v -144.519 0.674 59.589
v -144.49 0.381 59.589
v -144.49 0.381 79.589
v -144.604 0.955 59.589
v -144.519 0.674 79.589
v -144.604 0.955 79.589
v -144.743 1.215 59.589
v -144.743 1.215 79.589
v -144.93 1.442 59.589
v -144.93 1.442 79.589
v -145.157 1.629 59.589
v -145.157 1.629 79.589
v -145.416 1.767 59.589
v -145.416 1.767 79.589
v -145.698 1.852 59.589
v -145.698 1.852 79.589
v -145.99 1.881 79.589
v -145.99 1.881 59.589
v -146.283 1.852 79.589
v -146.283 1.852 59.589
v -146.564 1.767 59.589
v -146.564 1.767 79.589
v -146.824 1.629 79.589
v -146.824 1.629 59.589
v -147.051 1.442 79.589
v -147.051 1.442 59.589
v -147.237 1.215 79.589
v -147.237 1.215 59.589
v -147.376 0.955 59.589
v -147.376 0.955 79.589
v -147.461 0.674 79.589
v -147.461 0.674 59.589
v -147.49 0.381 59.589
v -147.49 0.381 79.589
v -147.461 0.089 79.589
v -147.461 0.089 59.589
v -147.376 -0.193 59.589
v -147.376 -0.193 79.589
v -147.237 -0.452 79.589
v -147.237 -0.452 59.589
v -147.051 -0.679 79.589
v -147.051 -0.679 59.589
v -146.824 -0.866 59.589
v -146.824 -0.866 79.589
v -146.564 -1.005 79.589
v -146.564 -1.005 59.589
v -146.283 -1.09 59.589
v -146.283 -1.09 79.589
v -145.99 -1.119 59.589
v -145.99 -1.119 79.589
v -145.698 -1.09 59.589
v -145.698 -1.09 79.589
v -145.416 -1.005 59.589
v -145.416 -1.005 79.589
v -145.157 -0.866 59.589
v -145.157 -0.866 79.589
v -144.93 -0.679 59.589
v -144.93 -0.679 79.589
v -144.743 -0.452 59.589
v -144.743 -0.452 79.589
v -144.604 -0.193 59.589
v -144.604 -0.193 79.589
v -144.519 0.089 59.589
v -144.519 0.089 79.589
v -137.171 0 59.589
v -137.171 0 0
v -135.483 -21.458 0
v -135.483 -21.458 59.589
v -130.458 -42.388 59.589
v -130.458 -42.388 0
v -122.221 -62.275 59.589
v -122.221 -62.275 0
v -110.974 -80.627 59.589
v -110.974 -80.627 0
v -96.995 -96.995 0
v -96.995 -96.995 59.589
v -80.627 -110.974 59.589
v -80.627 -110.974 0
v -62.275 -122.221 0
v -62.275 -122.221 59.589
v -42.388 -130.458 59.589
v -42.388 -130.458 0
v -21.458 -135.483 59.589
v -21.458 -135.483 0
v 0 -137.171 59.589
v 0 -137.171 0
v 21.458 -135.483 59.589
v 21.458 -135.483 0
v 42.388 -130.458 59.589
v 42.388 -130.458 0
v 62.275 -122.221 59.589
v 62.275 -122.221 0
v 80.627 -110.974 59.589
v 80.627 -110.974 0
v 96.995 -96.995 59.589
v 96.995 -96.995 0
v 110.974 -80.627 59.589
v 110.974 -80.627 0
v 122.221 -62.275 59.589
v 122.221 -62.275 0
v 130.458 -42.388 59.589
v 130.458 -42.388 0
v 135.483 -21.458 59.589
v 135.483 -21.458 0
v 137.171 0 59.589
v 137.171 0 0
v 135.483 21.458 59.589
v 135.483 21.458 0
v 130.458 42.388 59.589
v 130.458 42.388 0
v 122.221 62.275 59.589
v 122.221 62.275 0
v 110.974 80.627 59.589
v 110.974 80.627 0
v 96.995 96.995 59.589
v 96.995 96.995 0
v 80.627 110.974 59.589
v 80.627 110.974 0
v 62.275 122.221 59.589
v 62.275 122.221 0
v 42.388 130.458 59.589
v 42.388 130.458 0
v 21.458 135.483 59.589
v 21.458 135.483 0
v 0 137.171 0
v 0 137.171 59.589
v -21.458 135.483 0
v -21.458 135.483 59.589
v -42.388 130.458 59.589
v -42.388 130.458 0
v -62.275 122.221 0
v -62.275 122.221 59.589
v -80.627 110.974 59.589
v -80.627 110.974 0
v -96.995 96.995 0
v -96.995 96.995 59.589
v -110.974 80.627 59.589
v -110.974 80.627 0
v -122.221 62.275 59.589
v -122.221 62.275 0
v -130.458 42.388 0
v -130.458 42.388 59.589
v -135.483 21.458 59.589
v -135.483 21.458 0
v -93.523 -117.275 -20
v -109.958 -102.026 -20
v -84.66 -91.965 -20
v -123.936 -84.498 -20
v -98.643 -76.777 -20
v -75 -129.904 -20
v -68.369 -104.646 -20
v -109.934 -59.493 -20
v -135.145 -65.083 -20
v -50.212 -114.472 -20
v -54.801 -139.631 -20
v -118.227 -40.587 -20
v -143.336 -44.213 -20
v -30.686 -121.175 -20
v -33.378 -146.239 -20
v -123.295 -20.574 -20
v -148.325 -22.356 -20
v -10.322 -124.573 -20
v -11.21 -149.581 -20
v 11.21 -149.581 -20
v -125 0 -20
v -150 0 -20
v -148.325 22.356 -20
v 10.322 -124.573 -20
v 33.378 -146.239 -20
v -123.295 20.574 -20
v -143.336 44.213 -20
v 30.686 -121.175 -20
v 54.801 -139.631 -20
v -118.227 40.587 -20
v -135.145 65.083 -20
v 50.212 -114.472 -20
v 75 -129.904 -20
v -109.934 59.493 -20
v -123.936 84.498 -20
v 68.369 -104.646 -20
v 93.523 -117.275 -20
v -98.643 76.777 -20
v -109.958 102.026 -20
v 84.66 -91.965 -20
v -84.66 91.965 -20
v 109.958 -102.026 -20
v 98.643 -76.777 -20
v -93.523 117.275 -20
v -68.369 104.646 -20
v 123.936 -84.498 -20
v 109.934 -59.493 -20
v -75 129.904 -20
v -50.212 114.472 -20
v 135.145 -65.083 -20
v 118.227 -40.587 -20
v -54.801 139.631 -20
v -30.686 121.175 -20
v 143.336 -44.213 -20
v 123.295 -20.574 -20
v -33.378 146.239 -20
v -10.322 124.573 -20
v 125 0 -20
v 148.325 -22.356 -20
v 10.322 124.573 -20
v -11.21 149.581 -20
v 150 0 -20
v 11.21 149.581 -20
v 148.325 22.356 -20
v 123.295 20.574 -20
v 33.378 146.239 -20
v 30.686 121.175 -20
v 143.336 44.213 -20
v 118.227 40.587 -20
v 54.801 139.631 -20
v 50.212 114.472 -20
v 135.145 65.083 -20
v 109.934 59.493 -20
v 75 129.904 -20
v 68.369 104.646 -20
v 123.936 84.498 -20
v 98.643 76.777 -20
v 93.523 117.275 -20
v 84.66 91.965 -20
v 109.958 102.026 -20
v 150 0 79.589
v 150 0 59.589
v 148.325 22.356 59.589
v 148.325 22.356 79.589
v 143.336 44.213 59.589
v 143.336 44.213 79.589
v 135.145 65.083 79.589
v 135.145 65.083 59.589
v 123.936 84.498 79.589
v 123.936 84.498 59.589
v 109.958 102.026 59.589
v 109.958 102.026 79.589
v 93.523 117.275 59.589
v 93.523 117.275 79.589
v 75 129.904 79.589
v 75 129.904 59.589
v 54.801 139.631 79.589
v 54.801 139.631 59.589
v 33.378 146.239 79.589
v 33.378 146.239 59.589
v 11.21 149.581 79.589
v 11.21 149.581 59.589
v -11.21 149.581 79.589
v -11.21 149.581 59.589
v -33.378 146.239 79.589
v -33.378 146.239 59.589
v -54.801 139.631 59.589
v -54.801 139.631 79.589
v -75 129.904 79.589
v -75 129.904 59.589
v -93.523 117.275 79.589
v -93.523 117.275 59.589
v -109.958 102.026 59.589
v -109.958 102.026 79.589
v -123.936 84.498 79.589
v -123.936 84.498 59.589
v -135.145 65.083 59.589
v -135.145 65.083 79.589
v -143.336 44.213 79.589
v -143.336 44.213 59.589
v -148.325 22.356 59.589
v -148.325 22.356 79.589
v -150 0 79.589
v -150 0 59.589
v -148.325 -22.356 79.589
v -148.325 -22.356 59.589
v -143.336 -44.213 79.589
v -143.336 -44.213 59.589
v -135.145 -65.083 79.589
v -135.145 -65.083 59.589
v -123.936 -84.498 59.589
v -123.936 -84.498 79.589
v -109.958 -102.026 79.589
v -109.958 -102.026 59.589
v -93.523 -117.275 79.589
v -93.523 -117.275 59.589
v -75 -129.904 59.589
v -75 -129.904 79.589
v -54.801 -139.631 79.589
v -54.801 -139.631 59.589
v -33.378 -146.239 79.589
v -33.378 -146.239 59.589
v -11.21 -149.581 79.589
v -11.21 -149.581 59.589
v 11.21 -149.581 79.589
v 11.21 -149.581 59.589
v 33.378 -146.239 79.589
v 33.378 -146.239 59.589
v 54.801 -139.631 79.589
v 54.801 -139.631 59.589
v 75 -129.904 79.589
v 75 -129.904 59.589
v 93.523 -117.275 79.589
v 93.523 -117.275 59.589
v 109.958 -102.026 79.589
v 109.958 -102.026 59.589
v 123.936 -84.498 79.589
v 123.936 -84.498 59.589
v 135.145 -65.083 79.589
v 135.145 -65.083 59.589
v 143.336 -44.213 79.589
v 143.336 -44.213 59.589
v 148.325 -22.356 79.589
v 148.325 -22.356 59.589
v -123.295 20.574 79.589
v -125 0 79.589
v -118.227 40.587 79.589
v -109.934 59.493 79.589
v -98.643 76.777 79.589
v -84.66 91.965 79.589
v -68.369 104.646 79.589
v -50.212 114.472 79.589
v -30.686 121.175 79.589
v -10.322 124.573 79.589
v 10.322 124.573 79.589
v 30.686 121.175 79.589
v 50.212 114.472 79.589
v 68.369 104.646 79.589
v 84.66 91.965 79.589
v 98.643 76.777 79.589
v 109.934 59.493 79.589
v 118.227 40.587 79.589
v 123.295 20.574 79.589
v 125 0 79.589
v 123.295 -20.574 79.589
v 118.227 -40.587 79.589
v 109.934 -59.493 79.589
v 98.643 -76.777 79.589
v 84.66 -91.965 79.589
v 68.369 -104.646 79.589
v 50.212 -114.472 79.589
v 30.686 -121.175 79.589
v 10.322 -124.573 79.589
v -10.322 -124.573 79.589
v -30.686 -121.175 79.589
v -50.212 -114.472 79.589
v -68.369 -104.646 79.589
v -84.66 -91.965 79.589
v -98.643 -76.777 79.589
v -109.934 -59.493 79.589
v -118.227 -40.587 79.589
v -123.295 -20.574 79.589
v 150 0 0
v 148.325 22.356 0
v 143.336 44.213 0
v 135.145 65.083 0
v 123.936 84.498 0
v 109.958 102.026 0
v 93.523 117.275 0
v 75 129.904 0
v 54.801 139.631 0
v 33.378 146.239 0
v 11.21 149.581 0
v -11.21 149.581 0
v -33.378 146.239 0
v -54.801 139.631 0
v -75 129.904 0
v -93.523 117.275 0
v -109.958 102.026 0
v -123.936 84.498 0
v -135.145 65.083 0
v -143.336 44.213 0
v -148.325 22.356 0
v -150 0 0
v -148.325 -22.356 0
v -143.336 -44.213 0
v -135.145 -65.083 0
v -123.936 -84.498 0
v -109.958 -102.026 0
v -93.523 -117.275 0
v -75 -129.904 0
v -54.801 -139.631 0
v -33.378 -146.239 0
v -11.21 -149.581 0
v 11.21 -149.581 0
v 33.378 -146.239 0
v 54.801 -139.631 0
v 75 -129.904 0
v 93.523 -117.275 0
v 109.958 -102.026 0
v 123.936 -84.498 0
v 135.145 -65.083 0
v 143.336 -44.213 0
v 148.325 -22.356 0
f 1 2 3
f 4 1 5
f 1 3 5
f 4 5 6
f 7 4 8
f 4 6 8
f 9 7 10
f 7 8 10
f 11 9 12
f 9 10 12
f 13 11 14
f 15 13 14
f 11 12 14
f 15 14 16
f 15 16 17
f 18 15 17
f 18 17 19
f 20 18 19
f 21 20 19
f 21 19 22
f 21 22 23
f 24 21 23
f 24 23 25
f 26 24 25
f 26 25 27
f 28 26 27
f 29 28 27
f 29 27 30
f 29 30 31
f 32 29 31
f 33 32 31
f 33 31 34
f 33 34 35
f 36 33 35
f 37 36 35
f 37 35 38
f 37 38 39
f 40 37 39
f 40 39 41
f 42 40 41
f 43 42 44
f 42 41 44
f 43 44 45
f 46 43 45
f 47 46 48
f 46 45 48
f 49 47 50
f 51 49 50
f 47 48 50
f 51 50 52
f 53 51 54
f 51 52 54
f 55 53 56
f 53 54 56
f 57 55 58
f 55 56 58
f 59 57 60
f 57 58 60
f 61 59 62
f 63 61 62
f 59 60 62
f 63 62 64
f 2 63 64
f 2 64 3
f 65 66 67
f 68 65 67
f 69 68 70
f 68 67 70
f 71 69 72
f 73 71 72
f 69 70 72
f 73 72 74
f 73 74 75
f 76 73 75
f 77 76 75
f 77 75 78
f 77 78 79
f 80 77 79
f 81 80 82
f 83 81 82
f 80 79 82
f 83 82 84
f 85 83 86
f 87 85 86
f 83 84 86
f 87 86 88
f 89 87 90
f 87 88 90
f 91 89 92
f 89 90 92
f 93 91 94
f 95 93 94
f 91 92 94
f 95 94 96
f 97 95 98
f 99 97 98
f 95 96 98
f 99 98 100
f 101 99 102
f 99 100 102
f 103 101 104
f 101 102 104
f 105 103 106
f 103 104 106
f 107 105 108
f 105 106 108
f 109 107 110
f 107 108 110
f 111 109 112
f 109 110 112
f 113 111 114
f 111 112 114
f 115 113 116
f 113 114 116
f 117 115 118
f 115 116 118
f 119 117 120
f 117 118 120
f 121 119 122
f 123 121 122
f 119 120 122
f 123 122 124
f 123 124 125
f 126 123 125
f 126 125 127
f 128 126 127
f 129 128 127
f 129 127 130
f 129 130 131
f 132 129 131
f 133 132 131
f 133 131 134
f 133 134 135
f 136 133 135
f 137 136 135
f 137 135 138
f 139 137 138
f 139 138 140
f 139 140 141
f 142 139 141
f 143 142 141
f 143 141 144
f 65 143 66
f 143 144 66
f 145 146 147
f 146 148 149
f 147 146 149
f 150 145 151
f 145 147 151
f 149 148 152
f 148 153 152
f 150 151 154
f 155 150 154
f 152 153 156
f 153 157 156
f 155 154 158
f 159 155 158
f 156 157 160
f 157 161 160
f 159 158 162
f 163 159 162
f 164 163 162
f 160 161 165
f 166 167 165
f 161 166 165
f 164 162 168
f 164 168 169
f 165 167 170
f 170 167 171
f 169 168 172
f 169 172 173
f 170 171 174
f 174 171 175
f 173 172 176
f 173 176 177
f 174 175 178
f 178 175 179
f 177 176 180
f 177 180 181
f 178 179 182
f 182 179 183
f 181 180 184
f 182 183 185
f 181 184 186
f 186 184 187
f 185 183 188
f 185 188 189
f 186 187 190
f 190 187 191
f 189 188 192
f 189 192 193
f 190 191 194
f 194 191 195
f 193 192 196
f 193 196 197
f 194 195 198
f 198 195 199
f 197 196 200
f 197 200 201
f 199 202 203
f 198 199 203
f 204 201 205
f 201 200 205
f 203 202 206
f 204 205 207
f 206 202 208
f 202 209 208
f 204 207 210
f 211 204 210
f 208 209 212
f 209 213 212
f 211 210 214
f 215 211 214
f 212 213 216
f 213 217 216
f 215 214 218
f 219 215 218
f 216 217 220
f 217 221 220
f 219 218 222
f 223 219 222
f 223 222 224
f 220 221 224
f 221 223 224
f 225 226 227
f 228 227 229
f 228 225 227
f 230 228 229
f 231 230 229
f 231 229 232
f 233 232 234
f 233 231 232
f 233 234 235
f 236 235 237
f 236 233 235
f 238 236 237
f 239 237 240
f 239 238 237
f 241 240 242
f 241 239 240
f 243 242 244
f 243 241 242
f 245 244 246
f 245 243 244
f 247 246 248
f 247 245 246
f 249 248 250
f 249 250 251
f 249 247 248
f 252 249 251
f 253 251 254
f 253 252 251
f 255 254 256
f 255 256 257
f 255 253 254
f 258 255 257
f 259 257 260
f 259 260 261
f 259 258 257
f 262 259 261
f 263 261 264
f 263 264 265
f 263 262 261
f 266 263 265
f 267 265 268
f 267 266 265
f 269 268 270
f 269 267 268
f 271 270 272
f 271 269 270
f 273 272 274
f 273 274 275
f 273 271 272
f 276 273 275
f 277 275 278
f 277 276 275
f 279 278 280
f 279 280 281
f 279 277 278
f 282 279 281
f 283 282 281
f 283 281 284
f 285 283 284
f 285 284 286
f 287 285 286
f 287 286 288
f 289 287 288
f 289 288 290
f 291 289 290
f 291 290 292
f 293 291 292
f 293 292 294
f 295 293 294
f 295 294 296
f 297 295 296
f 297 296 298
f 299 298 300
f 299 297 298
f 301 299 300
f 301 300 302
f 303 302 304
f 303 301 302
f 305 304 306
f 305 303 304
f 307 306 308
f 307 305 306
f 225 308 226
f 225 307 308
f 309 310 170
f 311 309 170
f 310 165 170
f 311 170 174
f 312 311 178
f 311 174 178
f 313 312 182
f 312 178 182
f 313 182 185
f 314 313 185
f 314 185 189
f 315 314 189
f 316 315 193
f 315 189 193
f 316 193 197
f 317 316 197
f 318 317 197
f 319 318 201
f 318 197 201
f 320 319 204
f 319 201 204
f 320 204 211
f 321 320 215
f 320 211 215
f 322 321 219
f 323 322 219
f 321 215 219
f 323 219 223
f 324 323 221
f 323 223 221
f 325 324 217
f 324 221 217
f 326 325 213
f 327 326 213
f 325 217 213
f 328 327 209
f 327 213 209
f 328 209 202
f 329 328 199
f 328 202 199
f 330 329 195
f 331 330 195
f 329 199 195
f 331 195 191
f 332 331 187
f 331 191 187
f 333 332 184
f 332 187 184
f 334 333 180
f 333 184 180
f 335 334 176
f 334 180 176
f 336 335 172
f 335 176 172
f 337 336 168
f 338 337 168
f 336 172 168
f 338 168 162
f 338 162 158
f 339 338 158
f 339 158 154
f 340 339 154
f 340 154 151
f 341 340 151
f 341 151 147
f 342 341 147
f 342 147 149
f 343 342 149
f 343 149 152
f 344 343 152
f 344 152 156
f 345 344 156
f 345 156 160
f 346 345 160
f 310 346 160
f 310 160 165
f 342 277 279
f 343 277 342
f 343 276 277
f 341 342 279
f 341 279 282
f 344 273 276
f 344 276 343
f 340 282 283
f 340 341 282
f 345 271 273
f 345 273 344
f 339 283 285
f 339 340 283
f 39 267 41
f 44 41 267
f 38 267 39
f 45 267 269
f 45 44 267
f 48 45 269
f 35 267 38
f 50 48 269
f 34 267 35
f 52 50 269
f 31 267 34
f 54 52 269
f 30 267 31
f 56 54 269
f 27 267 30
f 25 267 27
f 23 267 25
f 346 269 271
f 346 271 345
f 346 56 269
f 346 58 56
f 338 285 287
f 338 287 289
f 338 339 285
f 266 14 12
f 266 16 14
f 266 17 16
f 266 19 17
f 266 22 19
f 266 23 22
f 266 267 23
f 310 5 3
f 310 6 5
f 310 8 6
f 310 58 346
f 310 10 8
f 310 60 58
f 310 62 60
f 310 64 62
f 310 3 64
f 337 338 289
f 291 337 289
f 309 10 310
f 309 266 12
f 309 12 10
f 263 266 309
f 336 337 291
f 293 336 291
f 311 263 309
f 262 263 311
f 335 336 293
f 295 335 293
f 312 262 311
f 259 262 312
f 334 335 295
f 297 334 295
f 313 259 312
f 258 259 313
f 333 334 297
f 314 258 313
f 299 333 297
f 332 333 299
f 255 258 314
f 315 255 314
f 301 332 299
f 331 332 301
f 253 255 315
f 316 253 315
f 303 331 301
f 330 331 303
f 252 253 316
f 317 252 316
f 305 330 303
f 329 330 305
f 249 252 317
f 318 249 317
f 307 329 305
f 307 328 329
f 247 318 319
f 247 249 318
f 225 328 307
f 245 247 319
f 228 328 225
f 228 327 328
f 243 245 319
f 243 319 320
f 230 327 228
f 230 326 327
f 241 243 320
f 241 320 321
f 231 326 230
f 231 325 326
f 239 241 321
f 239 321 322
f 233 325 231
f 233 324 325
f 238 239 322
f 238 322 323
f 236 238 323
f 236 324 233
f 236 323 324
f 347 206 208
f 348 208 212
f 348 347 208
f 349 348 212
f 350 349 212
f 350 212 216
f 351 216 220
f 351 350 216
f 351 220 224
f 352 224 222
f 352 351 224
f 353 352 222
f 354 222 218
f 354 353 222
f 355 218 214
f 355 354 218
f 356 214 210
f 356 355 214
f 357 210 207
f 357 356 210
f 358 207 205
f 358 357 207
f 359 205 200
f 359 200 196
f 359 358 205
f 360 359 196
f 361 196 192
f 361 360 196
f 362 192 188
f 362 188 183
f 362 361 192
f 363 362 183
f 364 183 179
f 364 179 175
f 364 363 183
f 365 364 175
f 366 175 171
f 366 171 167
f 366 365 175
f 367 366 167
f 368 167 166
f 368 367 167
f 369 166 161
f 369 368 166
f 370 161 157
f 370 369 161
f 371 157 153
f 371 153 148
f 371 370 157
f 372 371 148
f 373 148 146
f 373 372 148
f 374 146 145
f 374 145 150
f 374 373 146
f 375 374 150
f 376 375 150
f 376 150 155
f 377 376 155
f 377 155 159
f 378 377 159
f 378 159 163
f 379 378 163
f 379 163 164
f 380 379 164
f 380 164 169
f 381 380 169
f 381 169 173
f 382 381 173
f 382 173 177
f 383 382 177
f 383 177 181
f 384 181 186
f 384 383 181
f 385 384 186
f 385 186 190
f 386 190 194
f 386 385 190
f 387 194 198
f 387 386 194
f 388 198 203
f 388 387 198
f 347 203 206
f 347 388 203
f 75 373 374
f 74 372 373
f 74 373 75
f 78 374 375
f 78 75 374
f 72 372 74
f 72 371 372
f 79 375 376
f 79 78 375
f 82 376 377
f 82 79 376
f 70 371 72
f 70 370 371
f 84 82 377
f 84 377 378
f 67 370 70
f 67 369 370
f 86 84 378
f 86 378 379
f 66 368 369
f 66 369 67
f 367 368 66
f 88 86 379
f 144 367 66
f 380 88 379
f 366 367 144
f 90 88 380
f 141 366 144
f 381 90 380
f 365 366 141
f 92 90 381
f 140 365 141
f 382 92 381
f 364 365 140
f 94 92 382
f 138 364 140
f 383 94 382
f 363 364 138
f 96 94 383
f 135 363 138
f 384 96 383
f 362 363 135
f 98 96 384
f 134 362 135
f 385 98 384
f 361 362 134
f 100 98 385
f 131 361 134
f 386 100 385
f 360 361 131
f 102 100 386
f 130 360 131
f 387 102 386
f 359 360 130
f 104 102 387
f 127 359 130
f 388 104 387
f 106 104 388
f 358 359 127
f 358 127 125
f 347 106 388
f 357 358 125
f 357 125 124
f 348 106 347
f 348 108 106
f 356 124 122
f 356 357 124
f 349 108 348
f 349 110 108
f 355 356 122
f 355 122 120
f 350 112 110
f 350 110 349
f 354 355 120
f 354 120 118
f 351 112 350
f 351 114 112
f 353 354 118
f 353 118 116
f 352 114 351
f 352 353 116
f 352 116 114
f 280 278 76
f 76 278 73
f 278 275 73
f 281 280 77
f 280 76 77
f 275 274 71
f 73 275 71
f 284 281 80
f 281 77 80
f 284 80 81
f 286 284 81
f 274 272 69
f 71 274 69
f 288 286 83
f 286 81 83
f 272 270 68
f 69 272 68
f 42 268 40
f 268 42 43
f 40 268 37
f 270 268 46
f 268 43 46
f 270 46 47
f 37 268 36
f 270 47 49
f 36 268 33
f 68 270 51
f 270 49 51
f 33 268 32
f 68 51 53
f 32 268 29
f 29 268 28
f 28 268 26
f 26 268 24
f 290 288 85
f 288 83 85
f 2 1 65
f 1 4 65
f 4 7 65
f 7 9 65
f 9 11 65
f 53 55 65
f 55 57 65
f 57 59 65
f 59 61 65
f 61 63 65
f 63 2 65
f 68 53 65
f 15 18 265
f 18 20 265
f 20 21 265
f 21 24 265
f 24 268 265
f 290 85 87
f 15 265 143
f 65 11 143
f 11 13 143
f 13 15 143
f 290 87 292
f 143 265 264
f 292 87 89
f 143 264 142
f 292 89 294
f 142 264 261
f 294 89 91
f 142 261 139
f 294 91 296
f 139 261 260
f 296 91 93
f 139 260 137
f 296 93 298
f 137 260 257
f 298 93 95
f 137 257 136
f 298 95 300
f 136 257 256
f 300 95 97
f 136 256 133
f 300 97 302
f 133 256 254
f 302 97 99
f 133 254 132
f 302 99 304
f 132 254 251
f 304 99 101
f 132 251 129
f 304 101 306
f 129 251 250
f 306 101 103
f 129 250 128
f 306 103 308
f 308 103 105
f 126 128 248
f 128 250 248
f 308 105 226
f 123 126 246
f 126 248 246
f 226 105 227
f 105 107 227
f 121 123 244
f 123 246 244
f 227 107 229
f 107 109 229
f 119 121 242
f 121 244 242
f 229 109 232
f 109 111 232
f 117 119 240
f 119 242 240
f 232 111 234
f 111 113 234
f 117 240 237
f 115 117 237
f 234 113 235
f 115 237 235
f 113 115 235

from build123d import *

# Parameters (mm, degrees)
SKETCH1_R           = 150
BOSS_EXTRUDE2_DEPTH = 20
CUT_EXTRUDE1_REACH  = 215.073
SKETCH2_R           = 125
SKETCH3_R           = 137.171463505
BOSS_EXTRUDE3_DEPTH = 59.588855351
BOSS_EXTRUDE4_START = 20
SKETCH4_R           = 150
BOSS_EXTRUDE4_DEPTH = 20
SKETCH6_R           = 125
CUT_EXTRUDE2_DEPTH  = 227.570929062
CUT_EXTRUDE5_REACH  = 236.346
SKETCH7_R           = 1.5


with BuildPart() as part:
    # Sketch1 → Boss-Extrude2 (new body)
    with BuildSketch(Plane.XY):
        Circle(SKETCH1_R)
    extrude(amount=-BOSS_EXTRUDE2_DEPTH)

    # Sketch2 → Cut-Extrude1 (cut, up to next)
    with BuildSketch(Plane(origin=(0, 0, -20), x_dir=(-1, 0, 0), z_dir=(0, 0, -1)), mode=Mode.PRIVATE) as cut_extrude1_sk1:
        Circle(SKETCH2_R)
    cut_extrude1_tool1 = extrude(cut_extrude1_sk1.sketch, amount=-CUT_EXTRUDE1_REACH, mode=Mode.PRIVATE) & part.part
    add(cut_extrude1_tool1.solids().sort_by_distance((0, 0, -20))[0], mode=Mode.SUBTRACT)

    # Sketch3 → Boss-Extrude3 (add)
    with BuildSketch(Plane.XY):
        with Locations(Location((0, 0, 0), (0, 0, 180))):
            Circle(SKETCH3_R)
    extrude(amount=BOSS_EXTRUDE3_DEPTH)

    # Sketch4 → Boss-Extrude4 (add)
    with BuildSketch(Plane.XY.offset(59.588855351).offset(BOSS_EXTRUDE4_START)):
        Circle(SKETCH4_R)
    extrude(amount=-BOSS_EXTRUDE4_DEPTH)

    # Sketch6 → Cut-Extrude2 (cut, through all)
    with BuildSketch(Plane(origin=(0, 0, 0), x_dir=(-1, 0, 0), z_dir=(0, 0, -1))):
        Circle(SKETCH6_R)
    extrude(amount=-CUT_EXTRUDE2_DEPTH, mode=Mode.SUBTRACT)

    # Sketch7 → Cut-Extrude5 (cut, up to next)
    with BuildSketch(Plane.XY.offset(79.588855351), mode=Mode.PRIVATE) as cut_extrude5_sk1:
        with Locations((-145.990171569, 0.381304843)):
            Circle(SKETCH7_R)
    cut_extrude5_tool1 = extrude(cut_extrude5_sk1.sketch, amount=-CUT_EXTRUDE5_REACH, mode=Mode.PRIVATE) & part.part
    add(cut_extrude5_tool1.solids().sort_by_distance((-145.990172, 0.381305, 79.588855))[0], mode=Mode.SUBTRACT)


solid = part.part
